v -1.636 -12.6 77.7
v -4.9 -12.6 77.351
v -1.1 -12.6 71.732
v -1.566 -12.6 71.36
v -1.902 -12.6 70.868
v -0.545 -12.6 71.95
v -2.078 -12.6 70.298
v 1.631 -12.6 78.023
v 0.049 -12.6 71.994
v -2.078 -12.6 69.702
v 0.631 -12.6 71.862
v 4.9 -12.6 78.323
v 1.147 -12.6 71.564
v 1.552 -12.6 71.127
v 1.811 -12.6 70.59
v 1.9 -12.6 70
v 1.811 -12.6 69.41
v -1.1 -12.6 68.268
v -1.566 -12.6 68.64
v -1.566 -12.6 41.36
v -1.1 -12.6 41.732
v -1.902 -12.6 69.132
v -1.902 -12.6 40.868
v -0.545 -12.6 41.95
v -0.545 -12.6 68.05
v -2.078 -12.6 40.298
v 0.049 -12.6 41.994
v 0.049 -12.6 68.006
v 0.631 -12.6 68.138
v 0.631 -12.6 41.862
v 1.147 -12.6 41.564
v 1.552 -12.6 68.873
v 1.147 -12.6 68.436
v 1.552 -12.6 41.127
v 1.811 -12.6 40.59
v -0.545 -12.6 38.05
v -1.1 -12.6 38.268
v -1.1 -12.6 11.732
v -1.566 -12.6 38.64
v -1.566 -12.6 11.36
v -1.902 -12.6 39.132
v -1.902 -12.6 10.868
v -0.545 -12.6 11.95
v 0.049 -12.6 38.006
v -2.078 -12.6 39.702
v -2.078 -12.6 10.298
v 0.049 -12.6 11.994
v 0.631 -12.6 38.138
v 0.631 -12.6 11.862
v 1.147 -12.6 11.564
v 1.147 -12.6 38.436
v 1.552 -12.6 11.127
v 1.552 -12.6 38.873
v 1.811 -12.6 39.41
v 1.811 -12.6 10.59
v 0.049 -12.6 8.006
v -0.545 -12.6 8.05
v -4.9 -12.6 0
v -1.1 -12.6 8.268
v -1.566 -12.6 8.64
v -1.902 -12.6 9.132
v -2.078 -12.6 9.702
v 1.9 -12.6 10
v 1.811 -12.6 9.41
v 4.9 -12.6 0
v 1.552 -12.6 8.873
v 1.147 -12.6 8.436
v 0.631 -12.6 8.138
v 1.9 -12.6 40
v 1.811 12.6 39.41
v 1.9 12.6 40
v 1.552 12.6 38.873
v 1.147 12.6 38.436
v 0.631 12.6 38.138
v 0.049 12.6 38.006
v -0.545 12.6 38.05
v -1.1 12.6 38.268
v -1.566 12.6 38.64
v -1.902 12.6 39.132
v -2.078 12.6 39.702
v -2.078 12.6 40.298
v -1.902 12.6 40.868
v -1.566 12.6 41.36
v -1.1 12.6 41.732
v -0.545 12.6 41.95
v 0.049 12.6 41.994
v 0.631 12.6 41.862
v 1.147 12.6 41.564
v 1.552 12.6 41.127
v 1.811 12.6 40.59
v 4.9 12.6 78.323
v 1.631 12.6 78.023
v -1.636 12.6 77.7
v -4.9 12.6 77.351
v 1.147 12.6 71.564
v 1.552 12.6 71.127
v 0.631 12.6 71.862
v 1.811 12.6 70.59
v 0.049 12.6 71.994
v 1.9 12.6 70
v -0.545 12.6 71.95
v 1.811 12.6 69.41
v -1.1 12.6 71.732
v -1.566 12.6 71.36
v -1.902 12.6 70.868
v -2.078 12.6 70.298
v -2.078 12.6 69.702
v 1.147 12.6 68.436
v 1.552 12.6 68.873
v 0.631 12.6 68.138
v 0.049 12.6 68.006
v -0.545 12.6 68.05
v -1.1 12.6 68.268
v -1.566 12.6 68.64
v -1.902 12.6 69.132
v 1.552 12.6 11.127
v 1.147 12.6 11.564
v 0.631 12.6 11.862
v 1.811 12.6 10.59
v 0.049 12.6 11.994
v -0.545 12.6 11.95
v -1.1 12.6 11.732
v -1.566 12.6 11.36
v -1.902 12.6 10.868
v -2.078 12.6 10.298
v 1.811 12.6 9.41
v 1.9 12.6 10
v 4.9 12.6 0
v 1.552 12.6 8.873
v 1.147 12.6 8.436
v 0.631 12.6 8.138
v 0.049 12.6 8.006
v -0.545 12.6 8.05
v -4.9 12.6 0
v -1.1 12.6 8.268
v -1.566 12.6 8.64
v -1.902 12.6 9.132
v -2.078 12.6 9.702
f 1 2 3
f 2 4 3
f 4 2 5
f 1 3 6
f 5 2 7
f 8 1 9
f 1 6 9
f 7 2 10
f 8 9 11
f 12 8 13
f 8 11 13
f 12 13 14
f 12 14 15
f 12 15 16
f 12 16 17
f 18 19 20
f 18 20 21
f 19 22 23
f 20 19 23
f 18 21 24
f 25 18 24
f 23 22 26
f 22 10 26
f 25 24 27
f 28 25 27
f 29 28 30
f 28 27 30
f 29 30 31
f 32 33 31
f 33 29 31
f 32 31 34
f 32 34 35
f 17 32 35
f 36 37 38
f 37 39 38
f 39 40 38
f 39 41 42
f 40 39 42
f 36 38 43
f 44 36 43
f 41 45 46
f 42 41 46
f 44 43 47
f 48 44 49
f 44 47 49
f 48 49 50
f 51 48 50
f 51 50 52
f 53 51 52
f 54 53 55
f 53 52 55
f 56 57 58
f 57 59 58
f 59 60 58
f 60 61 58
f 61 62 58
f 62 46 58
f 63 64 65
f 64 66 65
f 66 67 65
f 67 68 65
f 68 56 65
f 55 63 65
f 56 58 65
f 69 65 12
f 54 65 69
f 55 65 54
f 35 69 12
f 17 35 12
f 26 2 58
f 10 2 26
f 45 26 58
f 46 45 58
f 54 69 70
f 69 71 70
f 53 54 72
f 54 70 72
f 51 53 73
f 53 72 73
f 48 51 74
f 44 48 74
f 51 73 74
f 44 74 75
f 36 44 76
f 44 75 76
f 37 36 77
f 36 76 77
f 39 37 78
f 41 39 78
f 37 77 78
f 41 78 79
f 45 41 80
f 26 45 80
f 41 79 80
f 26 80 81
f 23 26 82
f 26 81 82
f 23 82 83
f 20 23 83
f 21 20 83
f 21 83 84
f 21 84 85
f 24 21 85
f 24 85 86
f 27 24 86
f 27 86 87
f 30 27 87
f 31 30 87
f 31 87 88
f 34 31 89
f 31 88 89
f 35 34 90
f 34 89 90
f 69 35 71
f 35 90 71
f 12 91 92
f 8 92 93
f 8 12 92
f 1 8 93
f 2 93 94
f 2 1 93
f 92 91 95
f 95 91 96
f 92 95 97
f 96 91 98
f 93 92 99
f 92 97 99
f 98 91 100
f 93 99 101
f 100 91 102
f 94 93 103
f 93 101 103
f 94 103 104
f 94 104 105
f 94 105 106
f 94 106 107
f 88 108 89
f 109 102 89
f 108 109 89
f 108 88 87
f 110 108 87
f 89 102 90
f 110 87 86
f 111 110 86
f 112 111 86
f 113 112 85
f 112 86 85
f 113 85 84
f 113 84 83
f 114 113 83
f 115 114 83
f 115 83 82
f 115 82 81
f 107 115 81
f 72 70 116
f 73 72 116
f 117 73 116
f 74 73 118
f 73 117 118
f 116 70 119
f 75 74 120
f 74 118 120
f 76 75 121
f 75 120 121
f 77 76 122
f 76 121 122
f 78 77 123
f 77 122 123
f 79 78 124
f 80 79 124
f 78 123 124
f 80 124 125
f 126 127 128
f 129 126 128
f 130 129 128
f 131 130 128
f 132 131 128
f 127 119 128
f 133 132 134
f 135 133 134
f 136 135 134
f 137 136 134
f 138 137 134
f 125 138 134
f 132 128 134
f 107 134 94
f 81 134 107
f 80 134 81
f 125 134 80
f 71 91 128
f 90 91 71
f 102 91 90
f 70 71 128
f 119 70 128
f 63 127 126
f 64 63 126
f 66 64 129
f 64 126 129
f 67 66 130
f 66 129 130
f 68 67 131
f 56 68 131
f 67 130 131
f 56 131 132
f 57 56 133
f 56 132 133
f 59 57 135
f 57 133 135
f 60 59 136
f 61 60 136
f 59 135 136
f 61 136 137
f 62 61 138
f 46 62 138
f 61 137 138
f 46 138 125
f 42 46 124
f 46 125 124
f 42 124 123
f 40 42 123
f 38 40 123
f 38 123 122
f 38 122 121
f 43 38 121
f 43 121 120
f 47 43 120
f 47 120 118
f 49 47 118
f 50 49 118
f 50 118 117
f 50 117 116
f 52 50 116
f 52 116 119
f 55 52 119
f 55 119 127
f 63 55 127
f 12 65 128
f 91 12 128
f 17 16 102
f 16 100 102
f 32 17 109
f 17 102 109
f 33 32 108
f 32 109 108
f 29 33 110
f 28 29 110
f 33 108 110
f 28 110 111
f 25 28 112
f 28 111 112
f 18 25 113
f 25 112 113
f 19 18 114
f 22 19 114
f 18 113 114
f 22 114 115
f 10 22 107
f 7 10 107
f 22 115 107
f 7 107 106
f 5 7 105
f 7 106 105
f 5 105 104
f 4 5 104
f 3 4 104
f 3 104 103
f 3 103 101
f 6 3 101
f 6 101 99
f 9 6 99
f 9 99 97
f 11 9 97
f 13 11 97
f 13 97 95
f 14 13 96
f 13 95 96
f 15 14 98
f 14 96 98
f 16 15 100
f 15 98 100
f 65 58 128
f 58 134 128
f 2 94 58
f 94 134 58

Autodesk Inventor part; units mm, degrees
ref_plane "YZ Plane" through (0, 0, 0) normal (1, 0, 0) x (0, 1, 0)
ref_plane "XZ Plane" through (0, 0, 0) normal (0, 1, 0) x (-1, 0, 0)
ref_plane "XY Plane" through (0, 0, 0) normal (0, 0, 1) x (1, 0, 0)
sketch "Sketch1" plane through (0, 0, 0) normal (0, 0, 1) x (1, 0, 0)
  line L0 (4.9, 12.6) -> (-4.9, 12.6)
  line L1 (-4.9, 12.6) -> (-4.9, -12.6)
  line L2 (-4.9, -12.6) -> (4.9, -12.6)
  line L3 (4.9, -12.6) -> (4.9, 12.6)
  line L4 (4.9, 12.6) -> (-4.9, -12.6) construction
  line L5 (-4.9, 12.6) -> (4.9, -12.6) construction
  point P0 (0, 0)
  dimension "d0" = 25.2
  dimension "d1" = 9.8
extrude "Extrusion1" add sketch "Sketch1" along normal blind 80
sketch "Sketch2" plane through (-4.9, 12.6, 0) normal (0, 1, 0) x (1, 0, 0)
  circle A0 centre (4.8, -70) radius 2
  circle A1 centre (4.8, -40) radius 2
  circle A2 centre (4.8, -10) radius 2
  line L0 (9.8, -80) -> (0, -80) projected
  line L1 (9.8, 0) -> (0, 0) projected
  line L2 (9.8, 0) -> (9.8, -80) projected
  point P0 (4.9, 0)
  point P1 (9.8, -40)
  dimension "d4" = 4
  dimension "d5" = 4
  dimension "d6" = 4
  dimension "d7" = 10
  dimension "d8" = 10
  dimension "d9" = 40
  dimension "d10" = 5
  dimension "d11" = 5
  dimension "d12" = 5
extrude "Extrusion2" cut sketch "Sketch2" against normal blind 80
sketch "Sketch3" plane through (-4.9, -12.6, 0) normal (0, -1, 0) x (1, 0, 0)
  arc A0 (48.1, 80) -> (-9.1978, 76.2369) centre (48.1, -358.1) ccw
  line L0 (0, 80) -> (9.8, 80) projected
  line L1 (0, 0) -> (0, 80) projected
  line L2 (0, 80) -> (48.1, 80)
  line L3 (-9.1978, 76.2369) -> (-9.1978, 80)
  line L4 (-9.1978, 80) -> (0, 80)
  point P0 (4.9, 0)
  point P1 (4.9, 80)
  dimension "d15" = 876.2
  dimension "d17" = 48.1
  dimension "d18" = 438.1
extrude "Extrusion3" cut sketch "Sketch3" against normal through all
properties part number "ReleaseMec2.0SideWall"
